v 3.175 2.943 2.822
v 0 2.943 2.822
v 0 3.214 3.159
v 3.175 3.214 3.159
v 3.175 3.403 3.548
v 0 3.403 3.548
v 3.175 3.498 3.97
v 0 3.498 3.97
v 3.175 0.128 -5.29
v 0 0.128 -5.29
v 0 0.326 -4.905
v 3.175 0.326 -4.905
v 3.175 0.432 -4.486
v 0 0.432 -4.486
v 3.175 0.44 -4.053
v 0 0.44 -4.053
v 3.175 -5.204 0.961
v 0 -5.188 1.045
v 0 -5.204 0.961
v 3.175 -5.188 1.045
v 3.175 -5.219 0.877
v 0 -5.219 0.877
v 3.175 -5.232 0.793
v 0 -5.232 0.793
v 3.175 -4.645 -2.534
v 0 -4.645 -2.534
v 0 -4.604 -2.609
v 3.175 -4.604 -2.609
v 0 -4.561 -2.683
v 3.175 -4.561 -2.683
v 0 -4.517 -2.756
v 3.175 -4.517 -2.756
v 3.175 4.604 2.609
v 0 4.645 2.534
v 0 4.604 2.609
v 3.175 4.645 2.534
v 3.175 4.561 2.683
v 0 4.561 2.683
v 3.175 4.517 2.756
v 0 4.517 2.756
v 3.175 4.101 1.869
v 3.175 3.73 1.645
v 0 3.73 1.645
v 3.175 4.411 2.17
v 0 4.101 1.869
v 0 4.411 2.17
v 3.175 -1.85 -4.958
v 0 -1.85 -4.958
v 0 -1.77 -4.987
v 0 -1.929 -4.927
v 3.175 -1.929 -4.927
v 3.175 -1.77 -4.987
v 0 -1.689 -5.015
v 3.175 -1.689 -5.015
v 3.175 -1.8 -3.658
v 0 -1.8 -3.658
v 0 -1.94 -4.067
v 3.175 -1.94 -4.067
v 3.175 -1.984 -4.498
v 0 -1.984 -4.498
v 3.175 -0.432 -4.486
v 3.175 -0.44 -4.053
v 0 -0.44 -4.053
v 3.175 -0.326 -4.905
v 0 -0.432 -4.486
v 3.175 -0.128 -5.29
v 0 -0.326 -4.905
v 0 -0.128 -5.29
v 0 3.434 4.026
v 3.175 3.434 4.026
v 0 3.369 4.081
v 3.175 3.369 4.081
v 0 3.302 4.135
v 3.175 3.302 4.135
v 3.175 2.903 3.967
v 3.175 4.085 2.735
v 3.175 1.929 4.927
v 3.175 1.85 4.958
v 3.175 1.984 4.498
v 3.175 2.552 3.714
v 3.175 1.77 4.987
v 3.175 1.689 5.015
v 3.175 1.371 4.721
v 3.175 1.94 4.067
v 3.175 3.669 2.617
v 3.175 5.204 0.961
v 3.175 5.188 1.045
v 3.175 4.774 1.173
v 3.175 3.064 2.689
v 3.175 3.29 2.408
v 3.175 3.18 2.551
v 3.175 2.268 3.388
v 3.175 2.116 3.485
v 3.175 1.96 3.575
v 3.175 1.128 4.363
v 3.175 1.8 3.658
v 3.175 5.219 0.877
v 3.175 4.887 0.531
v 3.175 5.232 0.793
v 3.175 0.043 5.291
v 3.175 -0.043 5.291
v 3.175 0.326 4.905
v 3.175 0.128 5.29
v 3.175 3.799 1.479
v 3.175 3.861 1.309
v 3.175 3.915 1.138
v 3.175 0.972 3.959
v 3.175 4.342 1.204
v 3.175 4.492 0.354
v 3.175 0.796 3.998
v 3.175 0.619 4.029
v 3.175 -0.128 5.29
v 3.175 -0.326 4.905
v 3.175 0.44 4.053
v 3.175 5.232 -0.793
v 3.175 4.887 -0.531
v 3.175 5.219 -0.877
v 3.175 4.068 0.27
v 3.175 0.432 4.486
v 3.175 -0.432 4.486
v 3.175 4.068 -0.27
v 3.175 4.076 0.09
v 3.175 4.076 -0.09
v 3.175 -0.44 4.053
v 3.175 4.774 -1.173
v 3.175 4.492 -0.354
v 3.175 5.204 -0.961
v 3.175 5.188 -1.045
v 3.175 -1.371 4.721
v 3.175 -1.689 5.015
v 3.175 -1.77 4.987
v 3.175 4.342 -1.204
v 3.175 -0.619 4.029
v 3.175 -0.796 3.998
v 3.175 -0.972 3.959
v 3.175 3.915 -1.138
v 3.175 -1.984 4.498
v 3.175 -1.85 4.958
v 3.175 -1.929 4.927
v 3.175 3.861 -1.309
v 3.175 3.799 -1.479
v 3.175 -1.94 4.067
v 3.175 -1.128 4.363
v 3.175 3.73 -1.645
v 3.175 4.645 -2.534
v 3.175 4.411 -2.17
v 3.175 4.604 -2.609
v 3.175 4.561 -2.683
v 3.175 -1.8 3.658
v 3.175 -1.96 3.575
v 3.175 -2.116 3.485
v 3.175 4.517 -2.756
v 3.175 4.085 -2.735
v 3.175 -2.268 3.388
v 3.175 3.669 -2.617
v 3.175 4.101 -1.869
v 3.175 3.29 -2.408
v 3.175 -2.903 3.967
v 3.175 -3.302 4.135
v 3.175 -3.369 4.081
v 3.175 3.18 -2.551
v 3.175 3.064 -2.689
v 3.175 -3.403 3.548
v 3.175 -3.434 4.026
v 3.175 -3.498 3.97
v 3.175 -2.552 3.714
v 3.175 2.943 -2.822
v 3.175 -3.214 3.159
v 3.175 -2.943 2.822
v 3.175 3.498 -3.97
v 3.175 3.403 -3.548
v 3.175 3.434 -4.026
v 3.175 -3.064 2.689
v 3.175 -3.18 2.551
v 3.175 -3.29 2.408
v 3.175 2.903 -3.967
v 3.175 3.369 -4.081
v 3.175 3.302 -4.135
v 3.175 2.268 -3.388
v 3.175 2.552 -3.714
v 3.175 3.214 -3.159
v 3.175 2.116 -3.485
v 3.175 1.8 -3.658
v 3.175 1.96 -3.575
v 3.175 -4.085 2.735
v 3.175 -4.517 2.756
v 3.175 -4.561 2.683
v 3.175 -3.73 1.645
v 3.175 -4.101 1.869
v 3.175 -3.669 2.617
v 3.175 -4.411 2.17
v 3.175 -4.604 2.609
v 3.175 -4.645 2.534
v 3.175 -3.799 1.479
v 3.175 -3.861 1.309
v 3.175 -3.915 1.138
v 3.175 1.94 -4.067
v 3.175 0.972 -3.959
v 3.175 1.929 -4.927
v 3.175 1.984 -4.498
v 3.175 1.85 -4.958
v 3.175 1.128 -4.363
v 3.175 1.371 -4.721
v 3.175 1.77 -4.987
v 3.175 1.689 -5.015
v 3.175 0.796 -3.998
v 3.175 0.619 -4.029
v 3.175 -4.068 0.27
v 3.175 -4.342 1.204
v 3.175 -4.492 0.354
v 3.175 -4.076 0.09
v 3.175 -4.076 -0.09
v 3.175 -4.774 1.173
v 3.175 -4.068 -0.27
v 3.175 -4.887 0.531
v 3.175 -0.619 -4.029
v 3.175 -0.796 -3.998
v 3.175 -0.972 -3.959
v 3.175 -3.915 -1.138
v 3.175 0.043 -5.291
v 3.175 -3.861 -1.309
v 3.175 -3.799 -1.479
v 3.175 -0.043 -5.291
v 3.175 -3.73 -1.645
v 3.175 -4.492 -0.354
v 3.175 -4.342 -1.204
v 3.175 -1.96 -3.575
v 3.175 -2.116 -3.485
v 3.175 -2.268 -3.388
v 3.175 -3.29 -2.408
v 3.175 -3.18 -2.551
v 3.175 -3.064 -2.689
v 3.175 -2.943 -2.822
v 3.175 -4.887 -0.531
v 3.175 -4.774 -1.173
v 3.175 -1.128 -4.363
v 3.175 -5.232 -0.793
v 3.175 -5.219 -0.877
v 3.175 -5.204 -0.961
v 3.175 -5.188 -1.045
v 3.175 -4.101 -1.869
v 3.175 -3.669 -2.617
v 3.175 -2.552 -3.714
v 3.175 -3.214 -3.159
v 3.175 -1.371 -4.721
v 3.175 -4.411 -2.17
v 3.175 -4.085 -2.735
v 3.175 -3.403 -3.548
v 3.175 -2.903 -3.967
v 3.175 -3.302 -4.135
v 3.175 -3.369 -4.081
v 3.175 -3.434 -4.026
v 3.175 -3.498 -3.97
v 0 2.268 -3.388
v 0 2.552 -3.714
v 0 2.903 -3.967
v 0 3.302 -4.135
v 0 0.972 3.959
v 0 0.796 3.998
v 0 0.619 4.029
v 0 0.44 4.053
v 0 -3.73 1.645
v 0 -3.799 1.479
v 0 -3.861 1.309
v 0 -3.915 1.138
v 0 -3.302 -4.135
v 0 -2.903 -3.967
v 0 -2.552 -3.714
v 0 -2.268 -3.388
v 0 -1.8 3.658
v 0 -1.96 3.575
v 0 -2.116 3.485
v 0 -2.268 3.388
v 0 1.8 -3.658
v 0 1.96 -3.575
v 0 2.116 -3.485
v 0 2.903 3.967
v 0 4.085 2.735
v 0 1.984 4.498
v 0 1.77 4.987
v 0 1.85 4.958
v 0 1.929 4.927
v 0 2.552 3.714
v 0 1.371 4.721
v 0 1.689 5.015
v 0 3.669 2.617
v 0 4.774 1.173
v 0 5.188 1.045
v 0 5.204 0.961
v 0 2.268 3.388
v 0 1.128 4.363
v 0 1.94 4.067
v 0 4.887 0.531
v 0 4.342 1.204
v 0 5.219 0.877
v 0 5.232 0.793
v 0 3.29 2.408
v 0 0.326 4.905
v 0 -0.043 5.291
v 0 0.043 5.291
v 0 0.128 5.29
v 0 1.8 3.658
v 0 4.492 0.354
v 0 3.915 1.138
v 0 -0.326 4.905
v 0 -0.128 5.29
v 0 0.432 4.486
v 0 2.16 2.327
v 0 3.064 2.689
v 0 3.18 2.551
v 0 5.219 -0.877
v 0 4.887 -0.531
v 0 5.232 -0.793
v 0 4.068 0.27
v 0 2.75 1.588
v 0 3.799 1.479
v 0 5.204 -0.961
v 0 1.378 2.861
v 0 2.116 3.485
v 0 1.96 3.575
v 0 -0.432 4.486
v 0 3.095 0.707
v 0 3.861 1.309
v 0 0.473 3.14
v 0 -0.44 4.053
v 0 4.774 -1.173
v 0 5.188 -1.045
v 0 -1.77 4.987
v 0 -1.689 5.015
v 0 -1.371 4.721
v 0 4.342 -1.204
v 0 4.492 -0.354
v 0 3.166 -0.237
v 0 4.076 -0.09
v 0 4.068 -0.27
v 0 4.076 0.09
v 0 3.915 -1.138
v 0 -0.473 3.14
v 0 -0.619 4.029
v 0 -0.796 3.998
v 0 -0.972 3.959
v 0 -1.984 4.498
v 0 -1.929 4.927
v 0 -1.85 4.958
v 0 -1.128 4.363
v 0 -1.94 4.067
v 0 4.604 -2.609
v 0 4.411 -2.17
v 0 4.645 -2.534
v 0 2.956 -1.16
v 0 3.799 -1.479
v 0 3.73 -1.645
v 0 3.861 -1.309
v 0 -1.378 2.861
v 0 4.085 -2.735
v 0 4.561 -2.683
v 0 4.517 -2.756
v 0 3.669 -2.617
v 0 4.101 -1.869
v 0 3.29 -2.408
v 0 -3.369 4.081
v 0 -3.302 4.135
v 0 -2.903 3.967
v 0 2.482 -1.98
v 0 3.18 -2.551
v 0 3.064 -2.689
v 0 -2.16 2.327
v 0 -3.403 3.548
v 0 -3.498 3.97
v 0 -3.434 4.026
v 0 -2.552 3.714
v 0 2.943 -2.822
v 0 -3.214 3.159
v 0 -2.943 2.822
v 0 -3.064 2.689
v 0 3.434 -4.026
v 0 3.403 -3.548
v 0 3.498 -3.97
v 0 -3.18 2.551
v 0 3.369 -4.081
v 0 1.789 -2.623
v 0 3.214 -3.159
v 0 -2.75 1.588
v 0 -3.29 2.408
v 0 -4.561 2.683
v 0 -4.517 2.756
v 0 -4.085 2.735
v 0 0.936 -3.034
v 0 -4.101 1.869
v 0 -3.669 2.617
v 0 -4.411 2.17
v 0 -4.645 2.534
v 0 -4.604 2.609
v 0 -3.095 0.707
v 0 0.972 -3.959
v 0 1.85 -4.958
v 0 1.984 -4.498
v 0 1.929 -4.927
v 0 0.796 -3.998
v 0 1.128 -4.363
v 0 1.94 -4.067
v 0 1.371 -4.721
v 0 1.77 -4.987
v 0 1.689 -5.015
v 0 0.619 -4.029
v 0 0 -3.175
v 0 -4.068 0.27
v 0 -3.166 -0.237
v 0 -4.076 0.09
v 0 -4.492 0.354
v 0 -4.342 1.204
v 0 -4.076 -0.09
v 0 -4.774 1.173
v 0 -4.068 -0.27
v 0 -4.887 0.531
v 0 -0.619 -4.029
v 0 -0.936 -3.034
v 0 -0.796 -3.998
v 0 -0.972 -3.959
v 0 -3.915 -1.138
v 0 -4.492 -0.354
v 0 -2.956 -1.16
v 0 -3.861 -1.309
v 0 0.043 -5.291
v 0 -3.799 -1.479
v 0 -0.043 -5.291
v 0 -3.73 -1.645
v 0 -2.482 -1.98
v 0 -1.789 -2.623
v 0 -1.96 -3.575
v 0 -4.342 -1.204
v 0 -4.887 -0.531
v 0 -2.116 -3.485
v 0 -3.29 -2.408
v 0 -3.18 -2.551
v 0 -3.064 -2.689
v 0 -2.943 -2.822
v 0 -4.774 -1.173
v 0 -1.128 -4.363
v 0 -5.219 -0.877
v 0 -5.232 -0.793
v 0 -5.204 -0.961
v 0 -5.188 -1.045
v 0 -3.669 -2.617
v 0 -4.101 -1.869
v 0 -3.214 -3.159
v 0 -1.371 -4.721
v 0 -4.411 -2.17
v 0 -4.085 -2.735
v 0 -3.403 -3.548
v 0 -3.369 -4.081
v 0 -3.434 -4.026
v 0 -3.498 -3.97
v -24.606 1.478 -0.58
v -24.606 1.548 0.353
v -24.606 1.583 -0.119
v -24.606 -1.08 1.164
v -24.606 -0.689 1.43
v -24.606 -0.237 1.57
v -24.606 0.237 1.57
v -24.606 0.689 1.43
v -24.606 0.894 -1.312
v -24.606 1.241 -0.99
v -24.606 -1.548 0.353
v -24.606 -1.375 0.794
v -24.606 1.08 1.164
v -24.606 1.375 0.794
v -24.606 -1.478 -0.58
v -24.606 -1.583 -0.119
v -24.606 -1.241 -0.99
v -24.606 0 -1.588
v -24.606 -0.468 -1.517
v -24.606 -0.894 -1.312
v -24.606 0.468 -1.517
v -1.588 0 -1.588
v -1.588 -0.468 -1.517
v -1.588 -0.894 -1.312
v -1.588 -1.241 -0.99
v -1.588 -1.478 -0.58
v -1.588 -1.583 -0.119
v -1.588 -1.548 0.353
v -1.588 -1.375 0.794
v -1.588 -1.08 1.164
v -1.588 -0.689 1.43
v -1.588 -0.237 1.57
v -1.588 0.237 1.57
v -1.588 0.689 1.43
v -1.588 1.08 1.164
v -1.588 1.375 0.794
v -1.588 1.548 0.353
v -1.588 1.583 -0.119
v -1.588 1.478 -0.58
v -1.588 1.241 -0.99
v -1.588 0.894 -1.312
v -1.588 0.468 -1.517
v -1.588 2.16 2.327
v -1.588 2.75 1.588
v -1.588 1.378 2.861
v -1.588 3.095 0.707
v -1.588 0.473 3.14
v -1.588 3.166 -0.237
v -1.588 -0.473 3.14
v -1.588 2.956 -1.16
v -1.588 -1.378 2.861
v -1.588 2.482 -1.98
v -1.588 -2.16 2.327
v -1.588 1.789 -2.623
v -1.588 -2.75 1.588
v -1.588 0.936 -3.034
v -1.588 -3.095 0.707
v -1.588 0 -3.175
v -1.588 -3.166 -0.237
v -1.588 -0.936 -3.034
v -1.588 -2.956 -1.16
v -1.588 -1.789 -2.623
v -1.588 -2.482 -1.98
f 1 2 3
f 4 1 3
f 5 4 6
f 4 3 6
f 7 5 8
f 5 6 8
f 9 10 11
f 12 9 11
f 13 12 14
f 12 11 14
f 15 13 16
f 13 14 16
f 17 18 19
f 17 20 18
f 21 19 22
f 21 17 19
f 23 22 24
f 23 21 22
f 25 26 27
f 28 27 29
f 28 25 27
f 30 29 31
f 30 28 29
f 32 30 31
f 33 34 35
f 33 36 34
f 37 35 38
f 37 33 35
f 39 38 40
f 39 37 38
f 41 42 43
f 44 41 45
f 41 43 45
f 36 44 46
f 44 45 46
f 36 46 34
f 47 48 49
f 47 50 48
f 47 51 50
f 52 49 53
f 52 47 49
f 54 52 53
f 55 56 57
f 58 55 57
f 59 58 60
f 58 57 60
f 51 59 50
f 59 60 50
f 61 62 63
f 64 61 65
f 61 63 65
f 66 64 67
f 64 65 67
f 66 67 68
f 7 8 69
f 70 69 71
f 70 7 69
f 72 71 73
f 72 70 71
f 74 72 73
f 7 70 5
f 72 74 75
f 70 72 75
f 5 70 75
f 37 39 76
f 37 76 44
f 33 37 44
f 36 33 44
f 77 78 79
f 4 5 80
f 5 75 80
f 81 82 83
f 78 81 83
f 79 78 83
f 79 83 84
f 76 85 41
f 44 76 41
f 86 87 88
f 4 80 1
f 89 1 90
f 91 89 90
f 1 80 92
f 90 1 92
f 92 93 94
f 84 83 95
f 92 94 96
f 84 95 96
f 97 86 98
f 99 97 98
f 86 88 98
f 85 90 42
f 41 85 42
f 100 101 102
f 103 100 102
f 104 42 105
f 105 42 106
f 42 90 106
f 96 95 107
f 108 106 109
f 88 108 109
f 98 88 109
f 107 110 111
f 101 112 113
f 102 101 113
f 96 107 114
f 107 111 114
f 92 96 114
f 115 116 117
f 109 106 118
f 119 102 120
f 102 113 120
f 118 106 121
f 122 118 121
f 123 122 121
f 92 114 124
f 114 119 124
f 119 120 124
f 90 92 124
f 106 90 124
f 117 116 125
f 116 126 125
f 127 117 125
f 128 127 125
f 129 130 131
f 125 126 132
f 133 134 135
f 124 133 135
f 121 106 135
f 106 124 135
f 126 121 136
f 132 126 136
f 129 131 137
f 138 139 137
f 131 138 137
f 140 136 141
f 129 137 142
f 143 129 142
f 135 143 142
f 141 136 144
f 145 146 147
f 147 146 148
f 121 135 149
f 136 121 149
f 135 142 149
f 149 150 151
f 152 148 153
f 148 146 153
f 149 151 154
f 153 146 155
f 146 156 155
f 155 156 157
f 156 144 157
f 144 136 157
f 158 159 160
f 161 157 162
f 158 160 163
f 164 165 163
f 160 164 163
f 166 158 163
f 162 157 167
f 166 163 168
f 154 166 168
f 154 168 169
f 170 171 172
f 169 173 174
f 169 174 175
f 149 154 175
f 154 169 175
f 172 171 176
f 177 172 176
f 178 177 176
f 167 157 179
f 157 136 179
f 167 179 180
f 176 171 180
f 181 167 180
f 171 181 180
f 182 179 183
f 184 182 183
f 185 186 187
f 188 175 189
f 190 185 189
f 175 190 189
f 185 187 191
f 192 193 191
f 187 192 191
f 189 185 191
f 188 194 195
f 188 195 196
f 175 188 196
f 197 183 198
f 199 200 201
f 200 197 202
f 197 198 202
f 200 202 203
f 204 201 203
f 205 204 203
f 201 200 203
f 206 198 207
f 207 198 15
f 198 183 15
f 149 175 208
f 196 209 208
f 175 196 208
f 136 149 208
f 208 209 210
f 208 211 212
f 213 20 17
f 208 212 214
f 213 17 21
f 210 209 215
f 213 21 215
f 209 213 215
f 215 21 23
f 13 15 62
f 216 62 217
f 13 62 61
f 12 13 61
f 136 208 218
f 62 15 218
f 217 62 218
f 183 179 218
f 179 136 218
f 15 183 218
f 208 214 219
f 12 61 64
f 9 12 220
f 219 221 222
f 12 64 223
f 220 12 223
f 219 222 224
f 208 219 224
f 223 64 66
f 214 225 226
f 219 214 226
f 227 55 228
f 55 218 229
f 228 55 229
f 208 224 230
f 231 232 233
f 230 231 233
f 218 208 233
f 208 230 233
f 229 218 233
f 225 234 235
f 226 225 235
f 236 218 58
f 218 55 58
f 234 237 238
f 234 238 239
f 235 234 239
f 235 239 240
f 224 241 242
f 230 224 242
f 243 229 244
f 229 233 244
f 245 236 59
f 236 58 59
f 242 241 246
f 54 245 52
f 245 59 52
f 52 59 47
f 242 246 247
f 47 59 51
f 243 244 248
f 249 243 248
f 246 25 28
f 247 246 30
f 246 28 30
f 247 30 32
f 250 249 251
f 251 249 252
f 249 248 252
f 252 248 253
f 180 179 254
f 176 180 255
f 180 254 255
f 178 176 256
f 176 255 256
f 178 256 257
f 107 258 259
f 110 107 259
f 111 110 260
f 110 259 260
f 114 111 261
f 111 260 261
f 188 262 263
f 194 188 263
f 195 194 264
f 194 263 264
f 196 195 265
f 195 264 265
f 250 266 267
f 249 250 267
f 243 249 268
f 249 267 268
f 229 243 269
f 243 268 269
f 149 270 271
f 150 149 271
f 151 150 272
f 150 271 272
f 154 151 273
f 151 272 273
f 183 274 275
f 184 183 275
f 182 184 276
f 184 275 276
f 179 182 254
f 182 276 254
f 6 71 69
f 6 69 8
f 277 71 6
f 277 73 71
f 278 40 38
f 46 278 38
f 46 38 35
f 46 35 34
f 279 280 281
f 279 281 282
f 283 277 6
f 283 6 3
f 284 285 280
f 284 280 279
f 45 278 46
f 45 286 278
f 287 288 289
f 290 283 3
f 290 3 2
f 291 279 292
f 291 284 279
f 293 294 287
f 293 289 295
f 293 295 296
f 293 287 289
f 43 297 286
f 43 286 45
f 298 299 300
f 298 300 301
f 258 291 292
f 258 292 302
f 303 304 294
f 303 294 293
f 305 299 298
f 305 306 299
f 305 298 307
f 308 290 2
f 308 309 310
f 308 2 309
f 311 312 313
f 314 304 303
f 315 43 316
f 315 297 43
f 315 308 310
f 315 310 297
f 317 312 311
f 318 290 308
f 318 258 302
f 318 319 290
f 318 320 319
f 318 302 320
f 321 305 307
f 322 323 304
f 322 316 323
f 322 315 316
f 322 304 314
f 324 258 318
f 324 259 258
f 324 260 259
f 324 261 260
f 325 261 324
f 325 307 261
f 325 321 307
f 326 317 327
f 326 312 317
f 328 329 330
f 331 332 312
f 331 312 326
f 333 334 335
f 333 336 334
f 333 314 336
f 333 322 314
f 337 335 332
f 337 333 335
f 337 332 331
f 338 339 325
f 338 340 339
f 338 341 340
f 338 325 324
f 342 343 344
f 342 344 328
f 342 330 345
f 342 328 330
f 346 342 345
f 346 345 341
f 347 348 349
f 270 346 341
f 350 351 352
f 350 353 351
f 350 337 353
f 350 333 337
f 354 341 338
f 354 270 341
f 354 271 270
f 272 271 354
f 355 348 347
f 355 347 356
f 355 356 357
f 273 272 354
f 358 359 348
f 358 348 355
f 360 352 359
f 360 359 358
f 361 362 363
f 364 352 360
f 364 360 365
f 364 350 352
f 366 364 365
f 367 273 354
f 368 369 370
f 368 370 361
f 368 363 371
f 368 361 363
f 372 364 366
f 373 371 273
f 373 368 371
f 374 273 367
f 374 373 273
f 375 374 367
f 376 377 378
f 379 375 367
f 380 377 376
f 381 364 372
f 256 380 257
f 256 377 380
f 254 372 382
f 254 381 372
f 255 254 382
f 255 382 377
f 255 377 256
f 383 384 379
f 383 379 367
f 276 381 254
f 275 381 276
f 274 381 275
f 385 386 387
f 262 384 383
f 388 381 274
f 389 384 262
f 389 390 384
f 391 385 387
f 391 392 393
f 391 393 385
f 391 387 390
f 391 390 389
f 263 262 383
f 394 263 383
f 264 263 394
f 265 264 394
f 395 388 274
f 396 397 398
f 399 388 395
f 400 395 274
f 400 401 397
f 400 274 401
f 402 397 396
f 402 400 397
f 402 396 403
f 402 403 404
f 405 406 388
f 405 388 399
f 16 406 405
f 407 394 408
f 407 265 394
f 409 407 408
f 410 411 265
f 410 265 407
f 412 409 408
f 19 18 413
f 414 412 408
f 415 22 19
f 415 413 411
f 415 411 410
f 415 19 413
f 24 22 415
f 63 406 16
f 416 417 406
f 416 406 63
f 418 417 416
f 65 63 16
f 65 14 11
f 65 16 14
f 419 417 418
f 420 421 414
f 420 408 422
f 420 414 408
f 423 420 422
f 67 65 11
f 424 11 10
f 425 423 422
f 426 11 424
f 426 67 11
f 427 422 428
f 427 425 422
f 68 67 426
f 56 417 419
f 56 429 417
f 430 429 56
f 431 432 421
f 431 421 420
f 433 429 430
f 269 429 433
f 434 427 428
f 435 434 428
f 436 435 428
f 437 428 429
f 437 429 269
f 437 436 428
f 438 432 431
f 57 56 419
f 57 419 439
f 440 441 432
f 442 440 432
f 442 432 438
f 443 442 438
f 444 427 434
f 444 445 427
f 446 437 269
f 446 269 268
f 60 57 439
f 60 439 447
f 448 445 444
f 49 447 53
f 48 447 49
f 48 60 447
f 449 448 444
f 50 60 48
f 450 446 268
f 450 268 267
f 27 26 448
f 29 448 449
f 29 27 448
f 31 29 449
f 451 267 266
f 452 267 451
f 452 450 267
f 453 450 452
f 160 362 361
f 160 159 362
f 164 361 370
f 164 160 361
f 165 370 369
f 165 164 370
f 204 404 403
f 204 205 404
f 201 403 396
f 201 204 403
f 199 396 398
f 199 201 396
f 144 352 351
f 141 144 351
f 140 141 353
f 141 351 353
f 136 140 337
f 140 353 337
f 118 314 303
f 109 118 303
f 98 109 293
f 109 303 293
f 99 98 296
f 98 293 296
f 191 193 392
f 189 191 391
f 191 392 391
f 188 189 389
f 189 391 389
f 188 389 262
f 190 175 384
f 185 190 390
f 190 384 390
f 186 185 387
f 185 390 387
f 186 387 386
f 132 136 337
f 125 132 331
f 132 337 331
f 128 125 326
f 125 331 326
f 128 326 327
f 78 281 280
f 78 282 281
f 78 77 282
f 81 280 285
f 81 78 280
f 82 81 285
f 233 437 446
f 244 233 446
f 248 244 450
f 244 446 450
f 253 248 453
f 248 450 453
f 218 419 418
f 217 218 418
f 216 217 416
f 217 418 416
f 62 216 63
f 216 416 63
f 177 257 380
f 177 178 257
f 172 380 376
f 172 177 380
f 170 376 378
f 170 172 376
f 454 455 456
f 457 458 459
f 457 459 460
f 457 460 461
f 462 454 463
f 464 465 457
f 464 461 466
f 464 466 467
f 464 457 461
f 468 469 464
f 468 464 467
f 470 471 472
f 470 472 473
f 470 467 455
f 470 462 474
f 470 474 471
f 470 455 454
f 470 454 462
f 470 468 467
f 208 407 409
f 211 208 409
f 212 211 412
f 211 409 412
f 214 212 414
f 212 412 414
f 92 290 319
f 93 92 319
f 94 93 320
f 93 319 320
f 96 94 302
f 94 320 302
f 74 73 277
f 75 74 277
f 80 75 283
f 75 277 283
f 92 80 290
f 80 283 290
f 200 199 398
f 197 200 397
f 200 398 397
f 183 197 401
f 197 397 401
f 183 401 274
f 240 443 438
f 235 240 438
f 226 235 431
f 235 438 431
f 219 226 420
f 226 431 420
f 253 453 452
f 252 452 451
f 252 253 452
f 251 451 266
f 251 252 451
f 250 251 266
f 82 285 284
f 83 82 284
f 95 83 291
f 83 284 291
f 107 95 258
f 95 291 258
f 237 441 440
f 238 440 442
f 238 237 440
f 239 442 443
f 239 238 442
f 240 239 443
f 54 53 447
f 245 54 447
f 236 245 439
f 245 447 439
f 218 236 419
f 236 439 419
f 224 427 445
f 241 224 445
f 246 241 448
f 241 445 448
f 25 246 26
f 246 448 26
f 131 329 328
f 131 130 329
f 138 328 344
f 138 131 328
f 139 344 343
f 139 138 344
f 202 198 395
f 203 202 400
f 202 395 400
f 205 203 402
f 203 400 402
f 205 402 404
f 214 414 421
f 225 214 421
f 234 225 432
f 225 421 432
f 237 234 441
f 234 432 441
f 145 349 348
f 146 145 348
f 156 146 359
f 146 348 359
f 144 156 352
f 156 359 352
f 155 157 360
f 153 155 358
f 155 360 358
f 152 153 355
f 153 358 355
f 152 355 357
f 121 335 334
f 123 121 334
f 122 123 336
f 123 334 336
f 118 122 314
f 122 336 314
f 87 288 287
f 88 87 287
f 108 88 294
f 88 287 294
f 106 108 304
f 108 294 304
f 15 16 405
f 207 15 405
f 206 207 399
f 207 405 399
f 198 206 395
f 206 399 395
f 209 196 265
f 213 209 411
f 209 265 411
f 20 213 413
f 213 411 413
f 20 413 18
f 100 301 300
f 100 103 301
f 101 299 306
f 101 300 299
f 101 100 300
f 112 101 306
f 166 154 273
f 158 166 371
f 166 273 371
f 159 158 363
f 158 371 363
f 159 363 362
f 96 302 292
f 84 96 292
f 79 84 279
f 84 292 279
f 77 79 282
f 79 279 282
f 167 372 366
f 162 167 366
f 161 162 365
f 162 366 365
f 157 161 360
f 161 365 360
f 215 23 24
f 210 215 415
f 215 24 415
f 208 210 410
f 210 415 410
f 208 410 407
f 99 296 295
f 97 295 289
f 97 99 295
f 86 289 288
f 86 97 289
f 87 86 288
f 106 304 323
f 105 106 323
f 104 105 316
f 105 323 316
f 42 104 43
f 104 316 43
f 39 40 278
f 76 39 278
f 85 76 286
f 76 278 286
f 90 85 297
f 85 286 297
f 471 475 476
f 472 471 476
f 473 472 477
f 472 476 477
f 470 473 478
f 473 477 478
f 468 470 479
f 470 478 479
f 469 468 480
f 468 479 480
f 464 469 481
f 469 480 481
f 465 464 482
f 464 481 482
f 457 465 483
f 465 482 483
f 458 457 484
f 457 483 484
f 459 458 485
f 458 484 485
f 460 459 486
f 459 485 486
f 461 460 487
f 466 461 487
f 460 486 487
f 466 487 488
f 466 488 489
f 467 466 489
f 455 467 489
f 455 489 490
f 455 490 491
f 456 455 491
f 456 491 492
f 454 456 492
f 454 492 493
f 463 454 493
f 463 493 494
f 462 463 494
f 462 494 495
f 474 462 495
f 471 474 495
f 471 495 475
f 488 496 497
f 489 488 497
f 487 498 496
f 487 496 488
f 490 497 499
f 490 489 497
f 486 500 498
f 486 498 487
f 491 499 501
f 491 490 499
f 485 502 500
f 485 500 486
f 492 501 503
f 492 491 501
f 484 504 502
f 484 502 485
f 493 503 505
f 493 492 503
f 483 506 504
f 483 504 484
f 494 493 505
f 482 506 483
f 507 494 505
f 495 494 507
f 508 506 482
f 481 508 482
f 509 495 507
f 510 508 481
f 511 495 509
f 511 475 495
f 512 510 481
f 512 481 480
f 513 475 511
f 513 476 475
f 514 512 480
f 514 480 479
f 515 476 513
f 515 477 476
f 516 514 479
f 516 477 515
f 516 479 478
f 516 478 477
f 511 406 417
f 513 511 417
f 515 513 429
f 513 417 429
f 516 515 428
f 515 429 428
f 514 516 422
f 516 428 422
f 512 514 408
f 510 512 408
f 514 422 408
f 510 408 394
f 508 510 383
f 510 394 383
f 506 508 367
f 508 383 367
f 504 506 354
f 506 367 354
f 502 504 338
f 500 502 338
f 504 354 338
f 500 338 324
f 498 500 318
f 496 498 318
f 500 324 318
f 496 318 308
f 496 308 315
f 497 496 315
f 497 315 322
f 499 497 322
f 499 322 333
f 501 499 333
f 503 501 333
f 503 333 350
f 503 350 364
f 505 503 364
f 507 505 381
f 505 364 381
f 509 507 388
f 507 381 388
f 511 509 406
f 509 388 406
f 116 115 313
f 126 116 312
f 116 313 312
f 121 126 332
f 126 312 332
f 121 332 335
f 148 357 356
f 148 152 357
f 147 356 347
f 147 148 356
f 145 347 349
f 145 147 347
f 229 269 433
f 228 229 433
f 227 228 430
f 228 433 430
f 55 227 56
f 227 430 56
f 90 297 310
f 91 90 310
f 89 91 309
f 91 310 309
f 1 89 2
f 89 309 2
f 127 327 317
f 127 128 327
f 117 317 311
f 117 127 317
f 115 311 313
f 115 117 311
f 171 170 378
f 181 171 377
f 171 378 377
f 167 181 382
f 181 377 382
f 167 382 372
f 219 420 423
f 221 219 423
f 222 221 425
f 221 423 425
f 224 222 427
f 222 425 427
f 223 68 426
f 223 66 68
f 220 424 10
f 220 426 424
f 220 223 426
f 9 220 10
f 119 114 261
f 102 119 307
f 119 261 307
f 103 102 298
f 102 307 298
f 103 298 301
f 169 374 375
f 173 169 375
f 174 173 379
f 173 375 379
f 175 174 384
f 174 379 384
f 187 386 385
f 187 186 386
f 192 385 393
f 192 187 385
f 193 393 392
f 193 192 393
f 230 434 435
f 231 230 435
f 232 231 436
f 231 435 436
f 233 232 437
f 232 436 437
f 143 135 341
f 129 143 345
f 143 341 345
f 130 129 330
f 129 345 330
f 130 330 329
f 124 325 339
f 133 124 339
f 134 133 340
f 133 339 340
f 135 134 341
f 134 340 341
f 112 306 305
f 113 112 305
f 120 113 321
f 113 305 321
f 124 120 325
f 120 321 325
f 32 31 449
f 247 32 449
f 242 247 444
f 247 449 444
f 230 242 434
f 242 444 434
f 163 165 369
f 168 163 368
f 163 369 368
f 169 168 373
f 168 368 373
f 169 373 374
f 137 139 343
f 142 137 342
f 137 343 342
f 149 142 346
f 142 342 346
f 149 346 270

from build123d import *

# Parameters (mm, degrees)
BASPROSKE_W         = 3.175
BASPROSKE_H         = 5.291666667
TOOTHCUT_DEPTH      = 9.129212583
TEETHCUTS_COUNT     = 18
TEETHCUTS_ANGLE     = 340
SKETCH2_3_R         = 1.5875
BOSS_EXTRUDE1_DEPTH = 24.60625
SKETCH3_R           = 3.175
BOSS_EXTRUDE2_DEPTH = 1.5875


with BuildPart() as part:
    # BasProSke → Base-Revolve (revolve)
    with BuildSketch(Plane(origin=(0, 0, 0), x_dir=(1, 0, 0), z_dir=(0, 1, 0))):
        with Locations((1.5875, 2.645833334)):
            Rectangle(BASPROSKE_W, BASPROSKE_H)
    revolve(axis=Axis((-10, 0, 0), (1, 0, 0)))

    # TooCutSke → ToothCut (cut, through all)
    with BuildSketch(Plane(origin=(0, 0, 0), x_dir=(0, 0, -1), z_dir=(1, 0, 0))):
        with BuildLine():
            ThreePointArc((0.270003318, 4.067748898), (0, 4.0767), (-0.270003318, 4.067748898))
            ThreePointArc((-0.270003318, 4.067748898), (-0.437425956, 4.709129954), (-0.814487039, 5.254313352))
            ThreePointArc((-0.814487039, 5.254313352), (0, 5.317066667), (0.814487039, 5.254313352))
            ThreePointArc((0.814487039, 5.254313352), (0.437425956, 4.709129954), (0.270003318, 4.067748898))
        make_face()
    toothcut = extrude(amount=TOOTHCUT_DEPTH, mode=Mode.SUBTRACT)

    # TeethCuts: ToothCut ×18 about axis
    teethcuts_axis = Axis((-10, 0, 0), (1, 0, 0))
    for i in range(1, TEETHCUTS_COUNT):
        add(toothcut.rotate(teethcuts_axis, i * TEETHCUTS_ANGLE / (TEETHCUTS_COUNT - 1)), mode=Mode.SUBTRACT)

    # Sketch2<3> → Boss-Extrude1 (add)
    with BuildSketch(Plane.ZY):
        Circle(SKETCH2_3_R)
    extrude(amount=BOSS_EXTRUDE1_DEPTH)

    # Sketch3 → Boss-Extrude2 (add)
    with BuildSketch(Plane.ZY):
        Circle(SKETCH3_R)
    extrude(amount=BOSS_EXTRUDE2_DEPTH)


solid = part.part
